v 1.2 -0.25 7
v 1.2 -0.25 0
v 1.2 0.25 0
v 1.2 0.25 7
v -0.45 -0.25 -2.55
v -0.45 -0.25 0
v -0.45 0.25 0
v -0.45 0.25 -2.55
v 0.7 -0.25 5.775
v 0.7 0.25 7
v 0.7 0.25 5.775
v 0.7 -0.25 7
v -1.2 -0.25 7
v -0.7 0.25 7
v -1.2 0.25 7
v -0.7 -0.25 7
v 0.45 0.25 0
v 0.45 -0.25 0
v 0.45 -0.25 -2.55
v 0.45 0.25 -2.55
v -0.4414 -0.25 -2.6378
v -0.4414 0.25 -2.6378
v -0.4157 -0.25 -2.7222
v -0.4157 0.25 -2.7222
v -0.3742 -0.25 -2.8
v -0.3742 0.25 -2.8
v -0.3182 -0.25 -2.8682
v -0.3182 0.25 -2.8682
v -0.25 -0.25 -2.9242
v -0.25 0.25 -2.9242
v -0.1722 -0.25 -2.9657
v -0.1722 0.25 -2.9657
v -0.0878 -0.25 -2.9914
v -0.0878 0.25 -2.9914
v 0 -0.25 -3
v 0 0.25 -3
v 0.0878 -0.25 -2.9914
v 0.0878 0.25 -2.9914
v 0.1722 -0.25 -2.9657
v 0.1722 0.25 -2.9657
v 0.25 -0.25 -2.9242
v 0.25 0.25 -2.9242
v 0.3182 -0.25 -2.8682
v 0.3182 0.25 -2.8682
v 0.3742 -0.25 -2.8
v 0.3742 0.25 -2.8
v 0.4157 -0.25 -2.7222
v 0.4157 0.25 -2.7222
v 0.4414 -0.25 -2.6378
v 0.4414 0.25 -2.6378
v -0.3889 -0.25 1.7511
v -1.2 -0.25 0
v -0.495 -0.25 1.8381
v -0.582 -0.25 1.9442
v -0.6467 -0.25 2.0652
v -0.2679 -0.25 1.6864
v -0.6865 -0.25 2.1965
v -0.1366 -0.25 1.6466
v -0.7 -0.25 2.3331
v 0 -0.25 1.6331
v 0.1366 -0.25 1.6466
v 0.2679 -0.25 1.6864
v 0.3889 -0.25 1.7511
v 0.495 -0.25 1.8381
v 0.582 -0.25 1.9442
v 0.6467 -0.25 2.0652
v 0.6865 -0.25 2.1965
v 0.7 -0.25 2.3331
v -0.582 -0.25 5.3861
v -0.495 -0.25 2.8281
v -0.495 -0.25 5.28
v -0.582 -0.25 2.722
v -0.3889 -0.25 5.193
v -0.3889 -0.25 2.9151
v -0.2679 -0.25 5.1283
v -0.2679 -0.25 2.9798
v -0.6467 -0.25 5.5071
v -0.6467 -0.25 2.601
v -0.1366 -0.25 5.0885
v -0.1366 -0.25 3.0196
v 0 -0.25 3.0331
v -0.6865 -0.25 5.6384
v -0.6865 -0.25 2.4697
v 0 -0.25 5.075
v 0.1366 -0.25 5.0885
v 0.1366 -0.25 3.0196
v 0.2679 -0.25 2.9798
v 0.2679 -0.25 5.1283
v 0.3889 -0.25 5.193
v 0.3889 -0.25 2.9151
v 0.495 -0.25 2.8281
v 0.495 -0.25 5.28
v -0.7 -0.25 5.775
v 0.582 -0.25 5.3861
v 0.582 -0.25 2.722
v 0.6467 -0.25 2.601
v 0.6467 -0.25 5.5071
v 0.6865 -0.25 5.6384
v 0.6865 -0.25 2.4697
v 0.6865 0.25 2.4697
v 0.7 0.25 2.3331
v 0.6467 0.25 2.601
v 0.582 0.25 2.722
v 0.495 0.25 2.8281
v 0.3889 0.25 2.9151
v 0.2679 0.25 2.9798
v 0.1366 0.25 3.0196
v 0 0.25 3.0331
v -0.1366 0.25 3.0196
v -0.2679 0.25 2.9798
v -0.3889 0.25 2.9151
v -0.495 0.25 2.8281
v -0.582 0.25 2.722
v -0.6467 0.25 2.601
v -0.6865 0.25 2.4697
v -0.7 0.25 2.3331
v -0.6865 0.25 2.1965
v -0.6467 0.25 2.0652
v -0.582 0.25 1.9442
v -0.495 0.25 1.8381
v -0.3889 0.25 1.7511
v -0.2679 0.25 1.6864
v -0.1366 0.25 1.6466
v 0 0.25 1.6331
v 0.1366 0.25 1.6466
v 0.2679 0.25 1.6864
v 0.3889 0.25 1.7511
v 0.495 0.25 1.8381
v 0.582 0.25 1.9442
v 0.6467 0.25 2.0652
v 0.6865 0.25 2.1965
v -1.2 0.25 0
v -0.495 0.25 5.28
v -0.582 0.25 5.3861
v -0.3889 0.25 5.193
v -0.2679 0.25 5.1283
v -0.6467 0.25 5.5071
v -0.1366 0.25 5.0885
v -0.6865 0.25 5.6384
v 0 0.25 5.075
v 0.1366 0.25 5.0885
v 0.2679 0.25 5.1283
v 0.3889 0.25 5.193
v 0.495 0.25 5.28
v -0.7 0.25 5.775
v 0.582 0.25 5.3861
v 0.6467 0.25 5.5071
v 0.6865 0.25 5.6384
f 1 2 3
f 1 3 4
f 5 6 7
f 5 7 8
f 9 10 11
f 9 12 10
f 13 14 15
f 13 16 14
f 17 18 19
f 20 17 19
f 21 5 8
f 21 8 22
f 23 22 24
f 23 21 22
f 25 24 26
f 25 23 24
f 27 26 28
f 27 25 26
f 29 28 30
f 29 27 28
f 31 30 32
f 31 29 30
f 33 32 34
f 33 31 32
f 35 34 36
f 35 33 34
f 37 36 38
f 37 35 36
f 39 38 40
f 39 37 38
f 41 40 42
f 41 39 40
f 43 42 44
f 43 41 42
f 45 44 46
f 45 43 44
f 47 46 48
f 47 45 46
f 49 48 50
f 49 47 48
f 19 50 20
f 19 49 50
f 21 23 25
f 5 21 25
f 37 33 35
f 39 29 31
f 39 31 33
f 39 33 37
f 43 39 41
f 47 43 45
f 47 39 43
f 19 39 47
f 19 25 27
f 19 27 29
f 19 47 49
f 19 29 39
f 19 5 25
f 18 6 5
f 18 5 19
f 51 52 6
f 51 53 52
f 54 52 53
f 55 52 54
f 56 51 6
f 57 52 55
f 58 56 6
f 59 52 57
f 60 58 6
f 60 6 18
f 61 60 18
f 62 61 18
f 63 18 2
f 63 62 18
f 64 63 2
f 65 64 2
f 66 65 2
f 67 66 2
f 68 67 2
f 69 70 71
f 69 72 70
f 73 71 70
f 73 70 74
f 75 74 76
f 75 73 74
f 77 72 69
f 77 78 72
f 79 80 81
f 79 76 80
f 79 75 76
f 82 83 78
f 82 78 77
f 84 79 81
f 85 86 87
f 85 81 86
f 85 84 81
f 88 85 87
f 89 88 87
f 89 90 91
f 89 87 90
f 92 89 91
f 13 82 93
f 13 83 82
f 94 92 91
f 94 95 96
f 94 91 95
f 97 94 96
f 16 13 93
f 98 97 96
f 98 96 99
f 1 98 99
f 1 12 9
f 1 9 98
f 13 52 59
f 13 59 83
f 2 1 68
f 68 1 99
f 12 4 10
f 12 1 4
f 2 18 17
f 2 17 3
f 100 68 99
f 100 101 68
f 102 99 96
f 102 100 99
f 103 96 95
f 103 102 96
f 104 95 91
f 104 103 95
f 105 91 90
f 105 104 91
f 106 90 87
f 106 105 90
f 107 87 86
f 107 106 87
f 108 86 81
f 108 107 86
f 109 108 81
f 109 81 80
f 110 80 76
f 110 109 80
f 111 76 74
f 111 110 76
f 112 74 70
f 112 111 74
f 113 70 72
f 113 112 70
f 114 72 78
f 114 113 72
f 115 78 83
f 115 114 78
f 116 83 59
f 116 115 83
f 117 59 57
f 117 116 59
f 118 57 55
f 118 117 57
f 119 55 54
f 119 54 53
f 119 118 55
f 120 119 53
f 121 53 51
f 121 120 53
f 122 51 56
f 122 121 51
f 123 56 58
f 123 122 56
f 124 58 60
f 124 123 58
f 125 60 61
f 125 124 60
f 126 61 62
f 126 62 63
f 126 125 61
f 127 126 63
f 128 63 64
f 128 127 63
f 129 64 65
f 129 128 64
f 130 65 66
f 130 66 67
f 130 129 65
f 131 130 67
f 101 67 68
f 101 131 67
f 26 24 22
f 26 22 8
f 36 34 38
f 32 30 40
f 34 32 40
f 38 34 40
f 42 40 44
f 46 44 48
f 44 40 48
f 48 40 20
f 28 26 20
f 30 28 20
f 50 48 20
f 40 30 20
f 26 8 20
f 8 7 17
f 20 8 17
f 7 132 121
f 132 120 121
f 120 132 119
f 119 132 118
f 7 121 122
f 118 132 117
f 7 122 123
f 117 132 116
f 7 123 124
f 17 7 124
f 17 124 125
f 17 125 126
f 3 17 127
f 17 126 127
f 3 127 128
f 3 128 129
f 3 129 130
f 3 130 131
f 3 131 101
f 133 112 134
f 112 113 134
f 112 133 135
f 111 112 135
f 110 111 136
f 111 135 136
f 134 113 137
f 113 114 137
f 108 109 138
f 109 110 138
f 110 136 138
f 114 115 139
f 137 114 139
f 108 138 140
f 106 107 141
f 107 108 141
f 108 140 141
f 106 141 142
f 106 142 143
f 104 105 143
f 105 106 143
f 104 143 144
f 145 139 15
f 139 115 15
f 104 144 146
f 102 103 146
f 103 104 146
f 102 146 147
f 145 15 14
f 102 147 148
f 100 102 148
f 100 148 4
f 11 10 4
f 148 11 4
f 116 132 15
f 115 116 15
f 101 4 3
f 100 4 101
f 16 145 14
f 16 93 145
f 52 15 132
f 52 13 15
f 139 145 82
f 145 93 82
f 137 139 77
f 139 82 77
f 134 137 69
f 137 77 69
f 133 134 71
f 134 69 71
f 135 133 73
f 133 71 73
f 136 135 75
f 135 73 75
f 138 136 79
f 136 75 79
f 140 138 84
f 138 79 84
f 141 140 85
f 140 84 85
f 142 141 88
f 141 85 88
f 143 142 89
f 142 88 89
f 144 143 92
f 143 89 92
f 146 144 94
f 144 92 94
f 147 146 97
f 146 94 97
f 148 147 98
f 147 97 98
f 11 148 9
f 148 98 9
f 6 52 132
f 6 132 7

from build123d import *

# Parameters (mm, degrees)
SKETCH_R  = 0.7
PAD_DEPTH = 0.25


with BuildPart() as part:
    # Sketch → Pad (new body, symmetric)
    with BuildSketch(Plane.XZ):
        with BuildLine():
            Line((-1.2, 7), (-1.2, 0))
            Line((-1.2, 0), (-0.45, 0))
            Line((-0.45, 0), (-0.45, -2.55))
            ThreePointArc((-0.45, -2.55), (0, -3), (0.45, -2.55))
            Line((0.45, 0), (0.45, -2.55))
            Line((0.45, 0), (1.2, 0))
            Line((1.2, 0), (1.2, 7))
            Line((1.2, 7), (0.7, 7))
            Line((0.7, 7), (0.7, 5.775))
            ThreePointArc((-0.7, 5.775), (0, 5.075), (0.7, 5.775))
            Line((-0.7, 5.775), (-0.7, 7))
            Line((-0.7, 7), (-1.2, 7))
        make_face()
        with Locations((0, 2.3331)):
            Circle(SKETCH_R, mode=Mode.SUBTRACT)
    extrude(amount=PAD_DEPTH, both=True)


solid = part.part
